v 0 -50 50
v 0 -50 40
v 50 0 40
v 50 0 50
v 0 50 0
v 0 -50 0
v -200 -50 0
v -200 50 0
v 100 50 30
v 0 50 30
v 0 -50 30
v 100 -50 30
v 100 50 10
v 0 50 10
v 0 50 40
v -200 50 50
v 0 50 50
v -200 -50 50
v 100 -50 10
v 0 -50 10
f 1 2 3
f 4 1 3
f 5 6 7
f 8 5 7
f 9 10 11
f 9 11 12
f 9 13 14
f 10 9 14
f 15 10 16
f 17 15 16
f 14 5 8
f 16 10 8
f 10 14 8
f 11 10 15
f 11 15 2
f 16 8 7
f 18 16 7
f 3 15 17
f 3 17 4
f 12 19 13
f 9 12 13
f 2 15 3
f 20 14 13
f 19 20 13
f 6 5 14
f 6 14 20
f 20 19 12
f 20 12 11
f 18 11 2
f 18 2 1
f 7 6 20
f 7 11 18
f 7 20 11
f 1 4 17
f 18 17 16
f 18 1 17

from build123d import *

# Parameters (mm, degrees)
BOX001_W               = 70.7107
BOX001_H               = 70.7107
BOX001_DEPTH           = 10
BOX001_PLACEMENT_ANGLE = 315
BOX002_W               = 100
BOX002_H               = 100
BOX002_DEPTH           = 20
BOX_W                  = 200
BOX_H                  = 100
BOX_DEPTH              = 50


with BuildPart() as cube001:
    # Box001 → Box001 (new body)
    with BuildSketch(Plane.XY):
        with Locations((35.35535, 35.35535)):
            Rectangle(BOX001_W, BOX001_H)
    extrude(amount=BOX001_DEPTH)


with BuildPart() as cube001_1:
    # Box001 placement: moved
    add(cube001.part.moved(Location((-50, 0, 40))).rotate(Axis((-50, 0, 40), (0, 0, 1)), BOX001_PLACEMENT_ANGLE))


with BuildPart() as cube002:
    # Box002 → Box002 (new body)
    with BuildSketch(Plane(origin=(0, -50, 10), x_dir=(1, 0, 0), z_dir=(0, 0, 1))):
        with Locations((50, 50)):
            Rectangle(BOX002_W, BOX002_H)
    extrude(amount=BOX002_DEPTH)


with BuildPart() as fusion:
    # Box → Box (new body)
    with BuildSketch(Plane(origin=(0, 50, 0), x_dir=(-1, 0, 0), z_dir=(0, 0, 1))):
        with Locations((100, 50)):
            Rectangle(BOX_W, BOX_H)
    extrude(amount=BOX_DEPTH)

    # Fusion: union Cube001, Cube002
    add(cube001_1.part)
    add(cube002.part)


solid = fusion.part
